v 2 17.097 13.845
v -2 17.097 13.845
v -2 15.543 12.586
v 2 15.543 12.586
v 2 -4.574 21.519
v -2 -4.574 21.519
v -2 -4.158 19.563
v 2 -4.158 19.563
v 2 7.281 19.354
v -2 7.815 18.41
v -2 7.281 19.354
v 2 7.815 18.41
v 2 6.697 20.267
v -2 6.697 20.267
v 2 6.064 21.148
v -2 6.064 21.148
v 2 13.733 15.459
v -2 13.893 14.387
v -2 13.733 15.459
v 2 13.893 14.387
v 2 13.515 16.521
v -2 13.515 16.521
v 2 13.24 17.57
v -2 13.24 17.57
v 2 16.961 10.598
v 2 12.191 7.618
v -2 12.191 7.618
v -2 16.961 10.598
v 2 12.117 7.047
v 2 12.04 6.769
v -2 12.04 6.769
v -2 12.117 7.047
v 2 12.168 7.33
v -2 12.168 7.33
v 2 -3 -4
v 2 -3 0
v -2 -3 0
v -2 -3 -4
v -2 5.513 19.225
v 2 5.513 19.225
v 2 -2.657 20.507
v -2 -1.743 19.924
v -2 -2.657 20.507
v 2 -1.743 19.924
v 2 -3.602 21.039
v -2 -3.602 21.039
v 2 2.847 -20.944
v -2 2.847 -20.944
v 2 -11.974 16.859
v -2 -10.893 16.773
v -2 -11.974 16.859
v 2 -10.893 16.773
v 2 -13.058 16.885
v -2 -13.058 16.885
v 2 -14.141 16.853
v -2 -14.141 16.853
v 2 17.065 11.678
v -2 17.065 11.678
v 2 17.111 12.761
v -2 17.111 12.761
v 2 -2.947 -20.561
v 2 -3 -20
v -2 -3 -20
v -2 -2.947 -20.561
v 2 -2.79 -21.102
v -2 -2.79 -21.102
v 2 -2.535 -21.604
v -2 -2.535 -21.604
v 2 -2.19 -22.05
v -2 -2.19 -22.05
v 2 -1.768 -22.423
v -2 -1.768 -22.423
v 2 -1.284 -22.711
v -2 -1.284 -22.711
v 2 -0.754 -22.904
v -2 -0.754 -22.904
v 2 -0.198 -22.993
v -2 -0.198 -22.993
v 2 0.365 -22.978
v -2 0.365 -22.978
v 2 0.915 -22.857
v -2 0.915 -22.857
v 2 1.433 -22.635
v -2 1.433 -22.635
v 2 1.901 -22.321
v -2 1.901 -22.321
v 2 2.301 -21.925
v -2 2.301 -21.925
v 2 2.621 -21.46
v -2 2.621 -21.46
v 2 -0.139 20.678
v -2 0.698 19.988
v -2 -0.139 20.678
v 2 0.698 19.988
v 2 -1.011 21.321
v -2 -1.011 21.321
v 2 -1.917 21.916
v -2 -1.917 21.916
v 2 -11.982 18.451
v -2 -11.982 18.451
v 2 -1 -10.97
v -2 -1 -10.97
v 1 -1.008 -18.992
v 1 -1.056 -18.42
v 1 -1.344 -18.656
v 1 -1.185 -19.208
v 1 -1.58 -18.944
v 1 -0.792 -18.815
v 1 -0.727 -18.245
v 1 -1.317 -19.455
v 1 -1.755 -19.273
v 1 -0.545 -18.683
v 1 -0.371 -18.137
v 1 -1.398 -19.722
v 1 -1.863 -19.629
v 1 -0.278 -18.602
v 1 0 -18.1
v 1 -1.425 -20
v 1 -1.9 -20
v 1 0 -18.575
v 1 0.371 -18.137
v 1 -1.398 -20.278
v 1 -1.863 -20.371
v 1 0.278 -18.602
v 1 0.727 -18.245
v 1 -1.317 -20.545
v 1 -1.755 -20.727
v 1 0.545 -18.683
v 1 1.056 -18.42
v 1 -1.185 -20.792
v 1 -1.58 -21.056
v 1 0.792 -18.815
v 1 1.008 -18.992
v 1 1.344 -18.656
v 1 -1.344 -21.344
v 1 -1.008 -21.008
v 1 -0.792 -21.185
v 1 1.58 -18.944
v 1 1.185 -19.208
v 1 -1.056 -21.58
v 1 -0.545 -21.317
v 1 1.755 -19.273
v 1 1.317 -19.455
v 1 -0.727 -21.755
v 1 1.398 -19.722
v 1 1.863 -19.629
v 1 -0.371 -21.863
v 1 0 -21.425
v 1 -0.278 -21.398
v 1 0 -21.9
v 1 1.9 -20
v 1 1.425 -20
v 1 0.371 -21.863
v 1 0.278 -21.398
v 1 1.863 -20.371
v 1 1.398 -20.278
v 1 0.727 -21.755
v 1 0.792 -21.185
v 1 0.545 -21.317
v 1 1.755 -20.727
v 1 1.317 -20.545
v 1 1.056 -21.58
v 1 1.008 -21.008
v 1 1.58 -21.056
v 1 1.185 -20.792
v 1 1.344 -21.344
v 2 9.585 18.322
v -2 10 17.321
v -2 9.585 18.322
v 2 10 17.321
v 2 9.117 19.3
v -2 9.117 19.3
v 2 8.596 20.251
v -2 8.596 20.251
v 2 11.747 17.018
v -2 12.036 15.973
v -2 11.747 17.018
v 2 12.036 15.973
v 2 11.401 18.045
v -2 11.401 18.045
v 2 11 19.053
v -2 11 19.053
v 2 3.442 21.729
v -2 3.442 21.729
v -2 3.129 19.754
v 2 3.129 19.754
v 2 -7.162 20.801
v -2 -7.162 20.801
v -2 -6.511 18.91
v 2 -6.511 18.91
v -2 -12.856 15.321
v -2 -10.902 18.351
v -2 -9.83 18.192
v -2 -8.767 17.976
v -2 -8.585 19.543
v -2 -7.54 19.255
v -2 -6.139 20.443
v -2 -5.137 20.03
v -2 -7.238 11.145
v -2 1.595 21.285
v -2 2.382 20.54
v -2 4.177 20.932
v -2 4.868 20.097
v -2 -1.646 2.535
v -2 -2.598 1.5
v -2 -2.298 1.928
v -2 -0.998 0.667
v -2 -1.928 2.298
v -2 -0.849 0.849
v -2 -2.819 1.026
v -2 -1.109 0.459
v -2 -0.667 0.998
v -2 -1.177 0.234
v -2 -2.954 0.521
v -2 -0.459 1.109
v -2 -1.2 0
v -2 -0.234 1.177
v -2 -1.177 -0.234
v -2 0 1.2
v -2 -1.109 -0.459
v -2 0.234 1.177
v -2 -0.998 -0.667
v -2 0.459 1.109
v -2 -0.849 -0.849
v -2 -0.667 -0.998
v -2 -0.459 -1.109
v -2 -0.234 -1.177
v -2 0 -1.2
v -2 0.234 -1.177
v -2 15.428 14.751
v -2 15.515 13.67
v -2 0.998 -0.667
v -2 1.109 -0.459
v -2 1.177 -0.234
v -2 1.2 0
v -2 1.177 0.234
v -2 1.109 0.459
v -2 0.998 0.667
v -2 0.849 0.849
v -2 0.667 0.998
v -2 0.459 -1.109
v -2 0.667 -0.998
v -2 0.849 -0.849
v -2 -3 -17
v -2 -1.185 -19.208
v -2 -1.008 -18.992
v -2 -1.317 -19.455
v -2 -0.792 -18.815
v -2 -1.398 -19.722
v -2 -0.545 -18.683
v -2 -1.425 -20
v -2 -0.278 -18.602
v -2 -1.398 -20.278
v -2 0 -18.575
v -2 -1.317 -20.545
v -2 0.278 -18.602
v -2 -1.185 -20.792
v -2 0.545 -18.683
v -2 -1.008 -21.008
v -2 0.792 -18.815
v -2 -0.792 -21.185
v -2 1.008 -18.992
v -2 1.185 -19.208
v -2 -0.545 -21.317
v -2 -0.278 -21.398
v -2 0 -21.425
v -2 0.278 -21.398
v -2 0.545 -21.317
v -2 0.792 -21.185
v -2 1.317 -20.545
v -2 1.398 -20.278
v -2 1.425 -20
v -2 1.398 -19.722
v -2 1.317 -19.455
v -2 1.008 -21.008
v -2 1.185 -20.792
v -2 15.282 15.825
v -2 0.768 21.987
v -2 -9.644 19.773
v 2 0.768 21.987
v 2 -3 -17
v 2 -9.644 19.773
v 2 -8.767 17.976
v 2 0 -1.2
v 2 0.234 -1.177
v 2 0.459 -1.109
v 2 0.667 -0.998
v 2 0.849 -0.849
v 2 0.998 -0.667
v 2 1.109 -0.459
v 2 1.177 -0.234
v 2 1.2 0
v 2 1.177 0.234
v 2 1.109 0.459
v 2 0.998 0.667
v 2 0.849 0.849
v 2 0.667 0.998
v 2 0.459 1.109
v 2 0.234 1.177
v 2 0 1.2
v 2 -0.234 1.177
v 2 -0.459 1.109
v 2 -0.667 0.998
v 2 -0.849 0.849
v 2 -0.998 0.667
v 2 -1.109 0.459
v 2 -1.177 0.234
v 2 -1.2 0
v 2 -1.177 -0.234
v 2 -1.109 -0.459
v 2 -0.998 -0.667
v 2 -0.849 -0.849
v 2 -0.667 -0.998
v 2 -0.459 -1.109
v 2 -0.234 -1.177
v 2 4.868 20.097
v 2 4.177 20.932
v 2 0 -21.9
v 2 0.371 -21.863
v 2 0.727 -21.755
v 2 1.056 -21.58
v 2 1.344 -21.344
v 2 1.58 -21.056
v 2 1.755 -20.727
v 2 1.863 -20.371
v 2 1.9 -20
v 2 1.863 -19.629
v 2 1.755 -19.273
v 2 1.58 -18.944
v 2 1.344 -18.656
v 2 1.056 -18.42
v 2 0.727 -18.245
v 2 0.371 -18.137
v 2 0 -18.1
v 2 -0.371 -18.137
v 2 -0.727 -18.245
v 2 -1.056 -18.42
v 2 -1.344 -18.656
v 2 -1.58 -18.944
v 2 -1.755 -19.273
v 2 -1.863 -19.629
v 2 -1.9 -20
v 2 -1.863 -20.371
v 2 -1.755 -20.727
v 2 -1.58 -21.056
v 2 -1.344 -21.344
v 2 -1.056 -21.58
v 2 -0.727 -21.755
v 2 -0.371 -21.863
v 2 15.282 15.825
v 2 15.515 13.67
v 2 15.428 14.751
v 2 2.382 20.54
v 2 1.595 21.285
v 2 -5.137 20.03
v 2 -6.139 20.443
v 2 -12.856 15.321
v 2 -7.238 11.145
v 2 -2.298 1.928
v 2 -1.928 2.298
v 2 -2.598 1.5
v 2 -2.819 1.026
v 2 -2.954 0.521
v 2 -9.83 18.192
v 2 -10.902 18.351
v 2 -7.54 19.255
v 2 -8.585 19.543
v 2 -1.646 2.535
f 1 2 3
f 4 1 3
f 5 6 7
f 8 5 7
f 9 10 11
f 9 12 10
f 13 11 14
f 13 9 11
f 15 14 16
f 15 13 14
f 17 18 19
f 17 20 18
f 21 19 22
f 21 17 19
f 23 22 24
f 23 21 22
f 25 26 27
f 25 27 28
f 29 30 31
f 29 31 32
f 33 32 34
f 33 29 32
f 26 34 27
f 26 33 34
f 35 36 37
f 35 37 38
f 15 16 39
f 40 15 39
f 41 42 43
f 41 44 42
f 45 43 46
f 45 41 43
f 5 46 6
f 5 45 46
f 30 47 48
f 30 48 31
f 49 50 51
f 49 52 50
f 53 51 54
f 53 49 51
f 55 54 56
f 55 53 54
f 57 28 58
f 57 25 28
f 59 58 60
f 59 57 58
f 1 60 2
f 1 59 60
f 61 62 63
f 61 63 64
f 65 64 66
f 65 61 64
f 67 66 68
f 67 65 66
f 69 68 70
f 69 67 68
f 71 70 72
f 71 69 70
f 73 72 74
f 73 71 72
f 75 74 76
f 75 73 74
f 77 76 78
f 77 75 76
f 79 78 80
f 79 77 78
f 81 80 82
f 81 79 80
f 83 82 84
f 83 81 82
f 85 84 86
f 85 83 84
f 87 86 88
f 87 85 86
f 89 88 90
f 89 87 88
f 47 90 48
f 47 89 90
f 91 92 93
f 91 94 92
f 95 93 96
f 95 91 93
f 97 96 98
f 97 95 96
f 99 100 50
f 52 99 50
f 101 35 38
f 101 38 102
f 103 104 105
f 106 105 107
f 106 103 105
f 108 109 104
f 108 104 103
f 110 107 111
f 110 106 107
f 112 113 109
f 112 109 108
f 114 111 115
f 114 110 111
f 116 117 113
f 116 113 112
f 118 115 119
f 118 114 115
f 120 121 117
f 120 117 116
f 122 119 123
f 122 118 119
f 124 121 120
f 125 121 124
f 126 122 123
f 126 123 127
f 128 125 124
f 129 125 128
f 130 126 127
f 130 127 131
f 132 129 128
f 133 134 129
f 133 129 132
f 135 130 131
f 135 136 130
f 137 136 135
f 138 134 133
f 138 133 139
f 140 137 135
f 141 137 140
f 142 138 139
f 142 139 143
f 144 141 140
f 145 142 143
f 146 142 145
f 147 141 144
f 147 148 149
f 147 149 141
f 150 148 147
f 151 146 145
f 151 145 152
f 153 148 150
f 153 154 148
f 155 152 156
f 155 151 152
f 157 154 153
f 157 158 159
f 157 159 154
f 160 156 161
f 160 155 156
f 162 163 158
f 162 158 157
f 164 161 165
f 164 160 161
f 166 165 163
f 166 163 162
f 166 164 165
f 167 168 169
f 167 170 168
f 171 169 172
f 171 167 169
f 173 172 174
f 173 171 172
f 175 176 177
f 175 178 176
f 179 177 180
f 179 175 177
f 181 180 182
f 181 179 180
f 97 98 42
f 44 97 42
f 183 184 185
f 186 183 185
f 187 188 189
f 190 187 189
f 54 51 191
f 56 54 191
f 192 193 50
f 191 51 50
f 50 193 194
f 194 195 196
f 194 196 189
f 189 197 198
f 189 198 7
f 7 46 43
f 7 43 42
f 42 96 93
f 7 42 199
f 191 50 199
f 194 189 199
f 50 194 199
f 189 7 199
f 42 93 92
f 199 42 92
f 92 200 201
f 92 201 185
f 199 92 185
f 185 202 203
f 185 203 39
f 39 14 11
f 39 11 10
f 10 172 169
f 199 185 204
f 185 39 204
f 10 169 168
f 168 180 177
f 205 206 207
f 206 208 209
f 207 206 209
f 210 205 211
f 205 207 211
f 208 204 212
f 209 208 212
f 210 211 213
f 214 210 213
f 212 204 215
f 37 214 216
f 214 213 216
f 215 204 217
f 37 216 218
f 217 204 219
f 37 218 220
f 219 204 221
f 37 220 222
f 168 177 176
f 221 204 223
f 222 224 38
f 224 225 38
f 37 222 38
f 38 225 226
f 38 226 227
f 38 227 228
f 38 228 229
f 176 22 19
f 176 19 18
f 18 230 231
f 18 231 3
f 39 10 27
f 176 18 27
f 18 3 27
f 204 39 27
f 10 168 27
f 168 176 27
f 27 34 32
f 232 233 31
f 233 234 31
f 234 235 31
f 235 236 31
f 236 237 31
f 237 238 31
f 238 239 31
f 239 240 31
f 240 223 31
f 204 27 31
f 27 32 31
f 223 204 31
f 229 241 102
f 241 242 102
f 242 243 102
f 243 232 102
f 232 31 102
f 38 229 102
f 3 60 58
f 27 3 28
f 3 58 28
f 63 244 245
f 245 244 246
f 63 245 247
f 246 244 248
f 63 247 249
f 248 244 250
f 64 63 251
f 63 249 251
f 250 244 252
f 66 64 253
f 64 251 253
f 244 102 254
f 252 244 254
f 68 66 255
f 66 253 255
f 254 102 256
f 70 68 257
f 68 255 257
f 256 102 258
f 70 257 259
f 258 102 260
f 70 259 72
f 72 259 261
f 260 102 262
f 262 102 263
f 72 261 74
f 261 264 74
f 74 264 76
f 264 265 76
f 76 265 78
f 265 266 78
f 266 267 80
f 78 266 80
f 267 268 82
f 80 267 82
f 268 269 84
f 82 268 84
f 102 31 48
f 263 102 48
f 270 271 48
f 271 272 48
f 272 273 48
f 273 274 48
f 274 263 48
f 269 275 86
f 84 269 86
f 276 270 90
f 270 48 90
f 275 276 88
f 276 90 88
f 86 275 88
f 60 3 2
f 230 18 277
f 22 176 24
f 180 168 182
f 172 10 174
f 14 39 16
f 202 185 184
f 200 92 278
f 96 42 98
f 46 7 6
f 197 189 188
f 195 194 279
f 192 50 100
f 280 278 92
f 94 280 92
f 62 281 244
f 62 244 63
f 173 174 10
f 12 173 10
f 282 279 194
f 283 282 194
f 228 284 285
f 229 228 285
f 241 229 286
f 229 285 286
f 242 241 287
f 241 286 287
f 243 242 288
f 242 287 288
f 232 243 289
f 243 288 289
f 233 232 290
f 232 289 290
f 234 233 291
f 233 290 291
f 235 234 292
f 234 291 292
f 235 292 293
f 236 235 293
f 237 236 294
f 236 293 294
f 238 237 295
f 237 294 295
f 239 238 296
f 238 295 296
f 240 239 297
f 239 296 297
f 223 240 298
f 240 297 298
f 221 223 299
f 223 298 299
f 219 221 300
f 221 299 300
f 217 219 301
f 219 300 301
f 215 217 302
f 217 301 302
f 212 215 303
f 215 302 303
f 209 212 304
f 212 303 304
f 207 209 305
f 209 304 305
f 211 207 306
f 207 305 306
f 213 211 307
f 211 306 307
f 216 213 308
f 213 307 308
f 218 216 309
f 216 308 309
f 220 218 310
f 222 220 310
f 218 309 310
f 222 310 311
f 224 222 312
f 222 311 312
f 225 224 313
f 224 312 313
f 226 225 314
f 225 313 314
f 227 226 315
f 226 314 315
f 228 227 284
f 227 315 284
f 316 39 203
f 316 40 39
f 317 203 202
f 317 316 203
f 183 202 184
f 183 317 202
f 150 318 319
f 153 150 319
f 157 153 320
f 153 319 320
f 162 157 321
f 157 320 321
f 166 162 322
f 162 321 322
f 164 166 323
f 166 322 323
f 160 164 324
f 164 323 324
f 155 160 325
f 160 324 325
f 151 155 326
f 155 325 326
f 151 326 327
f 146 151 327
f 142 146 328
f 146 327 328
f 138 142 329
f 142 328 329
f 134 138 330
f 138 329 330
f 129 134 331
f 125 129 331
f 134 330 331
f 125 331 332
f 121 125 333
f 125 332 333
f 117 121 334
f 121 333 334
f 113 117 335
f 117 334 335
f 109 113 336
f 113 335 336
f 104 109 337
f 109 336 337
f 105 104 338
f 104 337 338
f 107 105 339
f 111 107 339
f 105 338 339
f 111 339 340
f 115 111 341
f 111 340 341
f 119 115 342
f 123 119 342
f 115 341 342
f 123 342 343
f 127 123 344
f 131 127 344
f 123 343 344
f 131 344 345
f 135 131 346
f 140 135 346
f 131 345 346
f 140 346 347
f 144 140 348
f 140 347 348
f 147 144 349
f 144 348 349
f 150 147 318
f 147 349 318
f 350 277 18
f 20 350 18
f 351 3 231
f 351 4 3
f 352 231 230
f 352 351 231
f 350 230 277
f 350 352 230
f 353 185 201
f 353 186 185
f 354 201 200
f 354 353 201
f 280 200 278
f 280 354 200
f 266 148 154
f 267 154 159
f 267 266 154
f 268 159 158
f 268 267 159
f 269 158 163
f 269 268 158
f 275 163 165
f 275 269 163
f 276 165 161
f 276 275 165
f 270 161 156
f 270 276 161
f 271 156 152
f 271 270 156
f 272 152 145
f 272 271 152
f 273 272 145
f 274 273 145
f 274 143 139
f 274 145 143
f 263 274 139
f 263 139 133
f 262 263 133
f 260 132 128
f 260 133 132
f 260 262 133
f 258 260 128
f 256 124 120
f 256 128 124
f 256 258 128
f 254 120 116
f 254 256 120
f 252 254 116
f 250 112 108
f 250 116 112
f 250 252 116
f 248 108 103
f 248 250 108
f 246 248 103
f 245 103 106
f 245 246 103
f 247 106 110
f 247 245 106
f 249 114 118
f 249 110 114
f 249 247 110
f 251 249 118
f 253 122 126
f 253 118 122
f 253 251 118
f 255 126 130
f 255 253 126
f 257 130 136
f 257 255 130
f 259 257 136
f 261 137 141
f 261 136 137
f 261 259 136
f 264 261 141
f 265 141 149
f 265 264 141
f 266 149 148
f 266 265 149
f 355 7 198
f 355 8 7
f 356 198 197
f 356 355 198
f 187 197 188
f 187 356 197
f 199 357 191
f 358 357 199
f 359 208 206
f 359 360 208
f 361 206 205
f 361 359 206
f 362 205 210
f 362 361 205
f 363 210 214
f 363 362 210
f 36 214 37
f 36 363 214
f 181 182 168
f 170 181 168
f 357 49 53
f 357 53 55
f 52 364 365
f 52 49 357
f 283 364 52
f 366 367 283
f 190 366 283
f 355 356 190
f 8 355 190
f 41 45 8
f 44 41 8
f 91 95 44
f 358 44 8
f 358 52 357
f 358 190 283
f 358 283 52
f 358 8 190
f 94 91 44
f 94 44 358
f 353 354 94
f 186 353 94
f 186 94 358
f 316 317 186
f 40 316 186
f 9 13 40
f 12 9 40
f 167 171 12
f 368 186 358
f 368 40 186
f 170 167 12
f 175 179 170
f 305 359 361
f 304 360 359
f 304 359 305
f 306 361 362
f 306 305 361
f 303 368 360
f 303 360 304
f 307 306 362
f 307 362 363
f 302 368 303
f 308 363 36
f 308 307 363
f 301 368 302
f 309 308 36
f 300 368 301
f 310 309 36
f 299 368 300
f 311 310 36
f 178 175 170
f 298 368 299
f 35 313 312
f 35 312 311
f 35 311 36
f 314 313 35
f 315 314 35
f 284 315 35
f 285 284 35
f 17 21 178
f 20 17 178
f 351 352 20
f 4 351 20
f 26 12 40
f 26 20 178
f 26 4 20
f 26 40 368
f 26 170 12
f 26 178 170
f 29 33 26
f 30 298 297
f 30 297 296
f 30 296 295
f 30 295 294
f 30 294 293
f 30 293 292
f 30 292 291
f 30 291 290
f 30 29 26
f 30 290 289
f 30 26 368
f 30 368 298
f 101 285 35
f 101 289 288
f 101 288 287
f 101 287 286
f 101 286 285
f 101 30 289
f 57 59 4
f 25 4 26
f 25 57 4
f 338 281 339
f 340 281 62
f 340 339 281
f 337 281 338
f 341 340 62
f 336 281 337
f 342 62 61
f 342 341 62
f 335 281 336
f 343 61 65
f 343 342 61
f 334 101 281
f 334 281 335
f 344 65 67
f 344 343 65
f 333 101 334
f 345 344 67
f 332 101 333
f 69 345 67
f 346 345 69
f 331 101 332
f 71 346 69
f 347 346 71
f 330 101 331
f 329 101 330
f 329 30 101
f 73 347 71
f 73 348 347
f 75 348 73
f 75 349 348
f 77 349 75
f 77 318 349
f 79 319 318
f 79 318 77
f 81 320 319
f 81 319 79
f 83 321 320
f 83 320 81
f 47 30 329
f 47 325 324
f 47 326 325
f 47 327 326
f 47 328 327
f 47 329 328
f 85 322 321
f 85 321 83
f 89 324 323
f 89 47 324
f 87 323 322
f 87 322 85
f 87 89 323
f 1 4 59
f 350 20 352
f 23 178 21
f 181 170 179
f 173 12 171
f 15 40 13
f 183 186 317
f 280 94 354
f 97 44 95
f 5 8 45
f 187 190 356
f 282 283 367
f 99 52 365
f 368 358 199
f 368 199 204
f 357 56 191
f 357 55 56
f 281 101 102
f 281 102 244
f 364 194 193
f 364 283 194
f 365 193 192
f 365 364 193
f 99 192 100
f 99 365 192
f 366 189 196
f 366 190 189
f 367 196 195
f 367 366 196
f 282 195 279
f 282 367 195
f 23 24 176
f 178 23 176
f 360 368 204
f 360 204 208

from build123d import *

# Parameters (mm, degrees)
SKETCH_1_R               = 1.2
SKETCH_1_R_2             = 1.425
EXTRUDE_1_DEPTH          = 2
SKETCH_3_R               = 1.9
CUT_EXTRUDE_2_DEPTH      = 1
EXTRUDE_2_DEPTH          = 2
EXTRUDE_3_DEPTH          = 2
PATTERN_CIRCULAR_1_COUNT = 13
PATTERN_CIRCULAR_1_ANGLE = 84
PATTERN_CIRCULAR_2_COUNT = 2
PATTERN_CIRCULAR_2_ANGLE = 7
SKETCH_1_2_R             = 1.2
CUT_EXTRUDE_3_DEPTH      = 2
CUT_EXTRUDE_4_DEPTH      = 3
CUT_EXTRUDE_4_DEPTH_BACK = 3


with BuildPart() as part:
    # 草图1 → 凸台-拉伸1 (new body, symmetric)
    with BuildSketch(Plane(origin=(0, 0, 0), x_dir=(0, 0, -1), z_dir=(1, 0, 0))):
        with BuildLine():
            Line((0, -3), (20, -3))
            ThreePointArc((20, -3), (22.961615091, -0.478368116), (20.944494821, 2.84744263))
            Line((20.944494821, 2.84744263), (-6.768956495, 12.039975948))
            ThreePointArc((-6.768956495, 12.039975948), (-10.195419033, 10.877714688), (-10.011584646, 7.264170488))
            Line((-10.011584646, 7.264170488), (-2.298133329, -1.928362829))
            ThreePointArc((-2.298133329, -1.928362829), (-1.267854785, -2.718923361), (0, -3))
        make_face()
        Circle(SKETCH_1_R, mode=Mode.SUBTRACT)
        with Locations((20, 0)):
            Circle(SKETCH_1_R_2, mode=Mode.SUBTRACT)
        with Locations((-7.713451316, 9.192533317)):
            Circle(SKETCH_1_R, mode=Mode.SUBTRACT)
    extrude(amount=EXTRUDE_1_DEPTH, both=True)

    # 草图3 → 切除-拉伸2 (cut)
    with BuildSketch(Plane(origin=(2, 0, 0), x_dir=(0, 0, -1), z_dir=(1, 0, 0))):
        with Locations((20, 0)):
            Circle(SKETCH_3_R)
    extrude(amount=-CUT_EXTRUDE_2_DEPTH, mode=Mode.SUBTRACT)

    # 草图4 → 凸台-拉伸2 (add, symmetric)
    with BuildSketch(Plane(origin=(0, 0, 0), x_dir=(0, 0, -1), z_dir=(1, 0, 0))):
        with BuildLine():
            Line((-11.14507328, -7.237695215), (0, 0))
            Line((0, 0), (-10.598385285, 16.960961923))
            ThreePointArc((-10.598385285, 16.960961923), (-19.753766812, 3.128689301), (-15.320888862, -12.855752194))
            Line((-15.320888862, -12.855752194), (-11.14507328, -7.237695215))
        make_face()
    extrude(amount=EXTRUDE_2_DEPTH, both=True)

    # 草图4<3> → 凸台-拉伸3 (add, symmetric)
    with BuildSketch(Plane(origin=(0, 0, 0), x_dir=(0, 0, -1), z_dir=(1, 0, 0))):
        with BuildLine():
            Line((-18.450752495, -11.98205877), (-16.773411359, -10.8927807))
            ThreePointArc((-16.773411359, -10.8927807), (-17.407113919, -9.848471202), (-17.975880926, -8.767422936))
            ThreePointArc((-17.975880926, -8.767422936), (-18.278712452, -10.365080481), (-18.450752495, -11.98205877))
        make_face()
    extrude_3 = extrude(amount=EXTRUDE_3_DEPTH, both=True)

    # 阵列(圆周)1: 凸台-拉伸3 ×13 about axis
    pattern_circular_1_axis = Axis((0, 0, 0), (-1, 0, 0))
    for i in range(1, PATTERN_CIRCULAR_1_COUNT):
        add(extrude_3.rotate(pattern_circular_1_axis, i * PATTERN_CIRCULAR_1_ANGLE / (PATTERN_CIRCULAR_1_COUNT - 1)))

    # 阵列(圆周)2: 凸台-拉伸3 ×2 about axis
    pattern_circular_2_axis = Axis((0, 0, 0), (1, 0, 0))
    for i in range(1, PATTERN_CIRCULAR_2_COUNT):
        add(extrude_3.rotate(pattern_circular_2_axis, i * PATTERN_CIRCULAR_2_ANGLE / (PATTERN_CIRCULAR_2_COUNT - 1)))

    # 草图1<2> → 切除-拉伸3 (cut, symmetric)
    with BuildSketch(Plane(origin=(0, 0, 0), x_dir=(0, 0, -1), z_dir=(1, 0, 0))):
        Circle(SKETCH_1_2_R)
    extrude(amount=CUT_EXTRUDE_3_DEPTH, both=True, mode=Mode.SUBTRACT)

    # 草图5 → 切除-拉伸4 (cut, two sides)
    with BuildSketch(Plane(origin=(0, 0, 0), x_dir=(0, 0, -1), z_dir=(1, 0, 0))) as cut_extrude_4_sk:
        Polygon((4, -3), (10.970443107, -1), (17, -3), align=None)
    extrude(amount=CUT_EXTRUDE_4_DEPTH, mode=Mode.SUBTRACT)
    extrude(cut_extrude_4_sk.sketch, amount=-CUT_EXTRUDE_4_DEPTH_BACK, mode=Mode.SUBTRACT)


solid = part.part
